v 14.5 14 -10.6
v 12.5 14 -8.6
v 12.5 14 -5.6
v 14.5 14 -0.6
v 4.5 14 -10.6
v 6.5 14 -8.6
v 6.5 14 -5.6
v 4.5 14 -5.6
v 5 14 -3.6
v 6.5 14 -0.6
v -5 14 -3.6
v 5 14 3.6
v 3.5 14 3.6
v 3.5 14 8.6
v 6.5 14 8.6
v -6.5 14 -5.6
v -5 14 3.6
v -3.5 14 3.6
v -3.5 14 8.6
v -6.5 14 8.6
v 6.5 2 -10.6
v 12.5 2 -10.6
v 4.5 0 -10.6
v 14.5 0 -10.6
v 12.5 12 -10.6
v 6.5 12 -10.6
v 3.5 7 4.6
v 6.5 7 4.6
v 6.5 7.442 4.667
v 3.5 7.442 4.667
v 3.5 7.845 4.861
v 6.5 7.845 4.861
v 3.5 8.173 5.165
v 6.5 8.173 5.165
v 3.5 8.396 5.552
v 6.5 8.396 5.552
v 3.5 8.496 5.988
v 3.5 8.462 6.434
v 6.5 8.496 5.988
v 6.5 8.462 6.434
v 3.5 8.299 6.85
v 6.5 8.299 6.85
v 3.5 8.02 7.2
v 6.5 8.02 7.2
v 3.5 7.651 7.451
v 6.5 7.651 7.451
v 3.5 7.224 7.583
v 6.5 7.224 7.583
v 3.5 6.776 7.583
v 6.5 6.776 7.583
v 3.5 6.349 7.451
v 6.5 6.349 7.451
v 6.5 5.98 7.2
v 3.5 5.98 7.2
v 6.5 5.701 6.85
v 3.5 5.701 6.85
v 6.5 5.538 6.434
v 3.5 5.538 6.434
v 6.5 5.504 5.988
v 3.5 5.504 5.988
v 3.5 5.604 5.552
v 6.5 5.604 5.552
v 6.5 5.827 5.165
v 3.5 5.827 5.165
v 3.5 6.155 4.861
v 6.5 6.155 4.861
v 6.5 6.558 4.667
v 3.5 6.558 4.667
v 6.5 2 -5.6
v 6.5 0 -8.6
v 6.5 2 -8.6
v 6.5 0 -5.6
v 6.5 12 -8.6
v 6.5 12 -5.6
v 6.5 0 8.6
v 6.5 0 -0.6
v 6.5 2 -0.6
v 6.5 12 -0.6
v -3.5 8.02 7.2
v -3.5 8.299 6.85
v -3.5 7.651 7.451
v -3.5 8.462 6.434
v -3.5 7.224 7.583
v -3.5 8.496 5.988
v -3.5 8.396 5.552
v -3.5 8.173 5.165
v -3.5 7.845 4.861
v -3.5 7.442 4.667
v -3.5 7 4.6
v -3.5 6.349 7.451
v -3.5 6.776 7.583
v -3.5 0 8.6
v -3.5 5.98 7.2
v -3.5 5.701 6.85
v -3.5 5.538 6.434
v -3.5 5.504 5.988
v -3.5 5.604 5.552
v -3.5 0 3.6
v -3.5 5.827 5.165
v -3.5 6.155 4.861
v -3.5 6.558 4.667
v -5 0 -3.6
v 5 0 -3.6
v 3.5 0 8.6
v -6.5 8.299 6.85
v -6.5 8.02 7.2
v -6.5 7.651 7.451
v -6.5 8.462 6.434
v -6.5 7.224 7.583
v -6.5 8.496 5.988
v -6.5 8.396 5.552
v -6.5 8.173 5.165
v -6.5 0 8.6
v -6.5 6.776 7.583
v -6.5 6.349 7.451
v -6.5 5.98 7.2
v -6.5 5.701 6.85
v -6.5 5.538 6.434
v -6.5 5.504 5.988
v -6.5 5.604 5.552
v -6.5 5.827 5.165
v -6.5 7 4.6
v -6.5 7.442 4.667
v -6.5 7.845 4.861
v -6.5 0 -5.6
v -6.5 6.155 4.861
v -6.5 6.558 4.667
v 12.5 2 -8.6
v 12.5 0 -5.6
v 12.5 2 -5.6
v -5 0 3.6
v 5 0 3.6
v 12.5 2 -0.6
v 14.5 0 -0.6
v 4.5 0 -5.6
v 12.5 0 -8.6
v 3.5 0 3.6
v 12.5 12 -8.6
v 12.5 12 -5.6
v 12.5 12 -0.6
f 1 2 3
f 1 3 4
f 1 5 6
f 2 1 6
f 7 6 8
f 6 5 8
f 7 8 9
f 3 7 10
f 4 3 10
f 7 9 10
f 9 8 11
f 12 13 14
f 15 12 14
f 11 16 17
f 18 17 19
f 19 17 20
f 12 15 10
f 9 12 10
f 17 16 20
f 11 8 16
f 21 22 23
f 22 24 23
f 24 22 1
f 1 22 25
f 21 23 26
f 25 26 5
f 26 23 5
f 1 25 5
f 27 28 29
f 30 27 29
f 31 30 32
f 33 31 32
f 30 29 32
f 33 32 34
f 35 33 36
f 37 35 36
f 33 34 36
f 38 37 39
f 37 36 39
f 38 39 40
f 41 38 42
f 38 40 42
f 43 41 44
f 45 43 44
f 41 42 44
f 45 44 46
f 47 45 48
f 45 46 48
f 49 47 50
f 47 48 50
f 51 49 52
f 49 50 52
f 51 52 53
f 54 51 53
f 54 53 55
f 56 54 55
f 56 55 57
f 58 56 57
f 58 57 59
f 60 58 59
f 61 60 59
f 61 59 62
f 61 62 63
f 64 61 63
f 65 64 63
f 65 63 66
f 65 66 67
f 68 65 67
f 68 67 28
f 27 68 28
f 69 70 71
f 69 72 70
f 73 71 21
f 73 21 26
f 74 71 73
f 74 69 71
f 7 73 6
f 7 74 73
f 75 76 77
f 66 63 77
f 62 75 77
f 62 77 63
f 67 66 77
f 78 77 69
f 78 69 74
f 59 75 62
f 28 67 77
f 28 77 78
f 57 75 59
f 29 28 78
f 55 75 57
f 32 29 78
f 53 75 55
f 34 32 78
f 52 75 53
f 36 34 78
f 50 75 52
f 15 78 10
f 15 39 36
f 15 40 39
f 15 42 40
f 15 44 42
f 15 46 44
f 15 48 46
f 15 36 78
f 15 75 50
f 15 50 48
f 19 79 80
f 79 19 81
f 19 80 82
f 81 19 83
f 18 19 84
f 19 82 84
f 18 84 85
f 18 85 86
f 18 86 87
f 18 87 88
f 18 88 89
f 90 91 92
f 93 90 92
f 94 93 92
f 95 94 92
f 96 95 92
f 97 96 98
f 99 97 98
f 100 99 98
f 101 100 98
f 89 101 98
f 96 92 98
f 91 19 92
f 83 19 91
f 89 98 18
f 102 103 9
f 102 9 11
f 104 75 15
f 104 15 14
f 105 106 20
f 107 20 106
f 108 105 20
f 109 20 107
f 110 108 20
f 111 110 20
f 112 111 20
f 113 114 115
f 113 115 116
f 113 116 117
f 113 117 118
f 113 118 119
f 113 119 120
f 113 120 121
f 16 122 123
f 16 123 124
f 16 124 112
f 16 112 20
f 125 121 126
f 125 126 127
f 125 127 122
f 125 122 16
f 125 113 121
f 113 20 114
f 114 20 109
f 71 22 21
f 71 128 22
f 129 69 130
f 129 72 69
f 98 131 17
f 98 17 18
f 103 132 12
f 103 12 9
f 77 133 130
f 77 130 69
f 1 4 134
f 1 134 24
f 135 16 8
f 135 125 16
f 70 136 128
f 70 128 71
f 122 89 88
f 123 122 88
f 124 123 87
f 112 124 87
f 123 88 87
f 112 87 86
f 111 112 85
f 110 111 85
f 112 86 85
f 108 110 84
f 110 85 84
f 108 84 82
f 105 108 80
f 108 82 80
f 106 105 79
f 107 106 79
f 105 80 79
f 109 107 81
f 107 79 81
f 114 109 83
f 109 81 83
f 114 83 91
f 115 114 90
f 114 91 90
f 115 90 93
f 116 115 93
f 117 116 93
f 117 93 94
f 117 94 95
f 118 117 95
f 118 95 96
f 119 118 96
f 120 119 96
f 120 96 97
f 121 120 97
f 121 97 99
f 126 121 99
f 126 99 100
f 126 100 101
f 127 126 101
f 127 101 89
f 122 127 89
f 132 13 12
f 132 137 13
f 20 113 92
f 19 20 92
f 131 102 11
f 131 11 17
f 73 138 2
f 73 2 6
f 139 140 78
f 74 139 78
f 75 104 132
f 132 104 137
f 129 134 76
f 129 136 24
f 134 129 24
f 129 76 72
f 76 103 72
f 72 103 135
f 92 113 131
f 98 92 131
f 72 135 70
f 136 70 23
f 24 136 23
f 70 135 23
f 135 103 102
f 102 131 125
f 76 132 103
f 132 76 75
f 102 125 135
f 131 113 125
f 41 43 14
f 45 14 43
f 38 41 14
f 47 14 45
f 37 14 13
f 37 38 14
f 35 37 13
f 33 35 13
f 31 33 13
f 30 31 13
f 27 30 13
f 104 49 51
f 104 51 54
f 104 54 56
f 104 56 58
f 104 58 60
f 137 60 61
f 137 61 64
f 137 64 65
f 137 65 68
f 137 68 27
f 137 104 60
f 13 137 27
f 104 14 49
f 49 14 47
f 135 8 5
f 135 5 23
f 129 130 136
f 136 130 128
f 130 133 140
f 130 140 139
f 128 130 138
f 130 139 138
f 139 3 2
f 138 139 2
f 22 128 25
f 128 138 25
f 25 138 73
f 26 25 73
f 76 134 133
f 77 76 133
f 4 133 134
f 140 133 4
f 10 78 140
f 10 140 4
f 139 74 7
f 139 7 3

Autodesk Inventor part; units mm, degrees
ref_plane "YZ Plane" through (0, 0, 0) normal (1, 0, 0) x (0, 1, 0)
ref_plane "XZ Plane" through (0, 0, 0) normal (0, 1, 0) x (-1, 0, 0)
ref_plane "XY Plane" through (0, 0, 0) normal (0, 0, 1) x (1, 0, 0)
sketch "Sketch1" plane through (0, 0, 0) normal (0, 1, 0) x (-1, 0, 0)
  line L0 (5, 3.6) -> (-5, 3.6)
  line L1 (-5, 3.6) -> (-5, -3.6)
  line L2 (-5, -3.6) -> (5, -3.6)
  line L3 (5, -3.6) -> (5, 3.6)
  line L4 (6.5, 8.6) -> (6.5, -5.6)
  line L5 (6.5, -5.6) -> (-6.5, -5.6)
  line L6 (-6.5, -5.6) -> (-6.5, 8.6)
  line L7 (-6.5, 8.6) -> (-3.5, 8.6)
  line L8 (6.5, 8.6) -> (3.5, 8.6)
  line L9 (3.5, 8.6) -> (3.5, 3.6)
  line L10 (-3.5, 8.6) -> (-3.5, 3.6)
  point P0 (0, 0)
  point P1 (5, 0)
  point P2 (0, -3.6)
  point P3 (-5, 8.6)
  point P4 (5, 8.6)
  dimension "d0" = 7.2
  dimension "d1" = 10
  dimension "d2" = 1.5
  dimension "d3" = 1.5
  dimension "d4" = 5
  dimension "d5" = 1.5
  dimension "d6" = 2
extrude "Extrusion1" add sketch "Sketch1" along normal blind 14 contours L0 L9 L8 L4 L5 L6 L7 L10 L1 L2 L3
sketch "Sketch2" plane through (6.5, 0, 8.6) normal (1, 0, 0) x (0, 0, -1)
  circle A0 centre (2.5, 7) radius 1.5
  line L0 (0, 0) -> (0, 14) projected
  point P0 (8.6, 0)
  point P1 (0, 7)
  dimension "d9" = 2.5
  dimension "d10" = 3
extrude "Extrusion2" cut sketch "Sketch2" against normal blind 14.75
sketch "Sketch3" plane through (6.5, 0, -5.6) normal (0, 0, -1) x (-1, 0, 0)
  line L0 (3, 0) -> (0, 0) projected
  line L1 (0, 0) -> (-6, 0)
  line L2 (-6, 0) -> (-6, 2)
  line L3 (-6, 2) -> (0, 2)
  line L4 (0, 2) -> (0, 0)
  line L5 (3, 14) -> (0, 14) projected
  line L6 (0, 14) -> (-6, 14)
  line L7 (-6, 14) -> (-6, 12)
  line L8 (-6, 12) -> (0, 12)
  line L9 (0, 12) -> (0, 14)
  line L10 (0, 0) -> (0, 14) projected
  point P0 (6.5, 0)
  point P1 (-6, 1)
  point P2 (-6, 13)
  dimension "d13" = 2
  dimension "d14" = 2
  dimension "d15" = 6
extrude "Extrusion3" add sketch "Sketch3" along normal mid plane 10
sketch "Sketch4" plane through (-6.5, 0, -5.6) normal (0, 0, -1) x (-1, 0, 0)
  line L0 (-13, 0) -> (-13, 14) projected
  line L1 (-10, 0) -> (-13, 0) projected
  line L2 (-13, 14) -> (-11, 14)
  line L3 (-11, 14) -> (-11, 0)
  line L4 (-11, 0) -> (-13, 0)
  line L5 (-13, 0) -> (-13, 14)
  point P0 (-6.5, 0)
  dimension "d18" = 2
extrude "Extrusion4" add sketch "Sketch4" along normal blind 5
sketch "Sketch5" plane through (0, 0, 0) normal (0, -1, 0) x (1, 0, 0)
  line L0 (12.5, -0.6) -> (12.5, -10.6) projected
  line L1 (6.5, -0.6) -> (6.5, -10.6) projected
  line L2 (12.5, -8.6) -> (6.5, -8.6)
  line L3 (6.5, -8.6) -> (6.5, -5.6)
  line L4 (6.5, -5.6) -> (12.5, -5.6)
  line L5 (12.5, -5.6) -> (12.5, -8.6)
  point P0 (0, 0)
  point P1 (9.5, -5.6)
  point P2 (4.5, -5.6)
  dimension "d21" = 3
extrude "Extrusion5" cut sketch "Sketch5" against normal blind 23.5
sketch "Sketch6" plane through (12.5, 0, -0.6) normal (1, 0, 0) x (0, 0, -1)
  line L0 (0, 0) -> (0, 2) projected
  line L1 (8, 14) -> (10, 14) projected
  line L2 (0, 0) -> (10, 0)
  line L3 (10, 0) -> (10, 14)
  line L4 (10, 14) -> (0, 14)
  line L5 (0, 14) -> (0, 0)
  point P0 (-0.6, 0)
extrude "Extrusion6" add sketch "Sketch6" along normal blind 2
properties part number "Frame_Clamp"
